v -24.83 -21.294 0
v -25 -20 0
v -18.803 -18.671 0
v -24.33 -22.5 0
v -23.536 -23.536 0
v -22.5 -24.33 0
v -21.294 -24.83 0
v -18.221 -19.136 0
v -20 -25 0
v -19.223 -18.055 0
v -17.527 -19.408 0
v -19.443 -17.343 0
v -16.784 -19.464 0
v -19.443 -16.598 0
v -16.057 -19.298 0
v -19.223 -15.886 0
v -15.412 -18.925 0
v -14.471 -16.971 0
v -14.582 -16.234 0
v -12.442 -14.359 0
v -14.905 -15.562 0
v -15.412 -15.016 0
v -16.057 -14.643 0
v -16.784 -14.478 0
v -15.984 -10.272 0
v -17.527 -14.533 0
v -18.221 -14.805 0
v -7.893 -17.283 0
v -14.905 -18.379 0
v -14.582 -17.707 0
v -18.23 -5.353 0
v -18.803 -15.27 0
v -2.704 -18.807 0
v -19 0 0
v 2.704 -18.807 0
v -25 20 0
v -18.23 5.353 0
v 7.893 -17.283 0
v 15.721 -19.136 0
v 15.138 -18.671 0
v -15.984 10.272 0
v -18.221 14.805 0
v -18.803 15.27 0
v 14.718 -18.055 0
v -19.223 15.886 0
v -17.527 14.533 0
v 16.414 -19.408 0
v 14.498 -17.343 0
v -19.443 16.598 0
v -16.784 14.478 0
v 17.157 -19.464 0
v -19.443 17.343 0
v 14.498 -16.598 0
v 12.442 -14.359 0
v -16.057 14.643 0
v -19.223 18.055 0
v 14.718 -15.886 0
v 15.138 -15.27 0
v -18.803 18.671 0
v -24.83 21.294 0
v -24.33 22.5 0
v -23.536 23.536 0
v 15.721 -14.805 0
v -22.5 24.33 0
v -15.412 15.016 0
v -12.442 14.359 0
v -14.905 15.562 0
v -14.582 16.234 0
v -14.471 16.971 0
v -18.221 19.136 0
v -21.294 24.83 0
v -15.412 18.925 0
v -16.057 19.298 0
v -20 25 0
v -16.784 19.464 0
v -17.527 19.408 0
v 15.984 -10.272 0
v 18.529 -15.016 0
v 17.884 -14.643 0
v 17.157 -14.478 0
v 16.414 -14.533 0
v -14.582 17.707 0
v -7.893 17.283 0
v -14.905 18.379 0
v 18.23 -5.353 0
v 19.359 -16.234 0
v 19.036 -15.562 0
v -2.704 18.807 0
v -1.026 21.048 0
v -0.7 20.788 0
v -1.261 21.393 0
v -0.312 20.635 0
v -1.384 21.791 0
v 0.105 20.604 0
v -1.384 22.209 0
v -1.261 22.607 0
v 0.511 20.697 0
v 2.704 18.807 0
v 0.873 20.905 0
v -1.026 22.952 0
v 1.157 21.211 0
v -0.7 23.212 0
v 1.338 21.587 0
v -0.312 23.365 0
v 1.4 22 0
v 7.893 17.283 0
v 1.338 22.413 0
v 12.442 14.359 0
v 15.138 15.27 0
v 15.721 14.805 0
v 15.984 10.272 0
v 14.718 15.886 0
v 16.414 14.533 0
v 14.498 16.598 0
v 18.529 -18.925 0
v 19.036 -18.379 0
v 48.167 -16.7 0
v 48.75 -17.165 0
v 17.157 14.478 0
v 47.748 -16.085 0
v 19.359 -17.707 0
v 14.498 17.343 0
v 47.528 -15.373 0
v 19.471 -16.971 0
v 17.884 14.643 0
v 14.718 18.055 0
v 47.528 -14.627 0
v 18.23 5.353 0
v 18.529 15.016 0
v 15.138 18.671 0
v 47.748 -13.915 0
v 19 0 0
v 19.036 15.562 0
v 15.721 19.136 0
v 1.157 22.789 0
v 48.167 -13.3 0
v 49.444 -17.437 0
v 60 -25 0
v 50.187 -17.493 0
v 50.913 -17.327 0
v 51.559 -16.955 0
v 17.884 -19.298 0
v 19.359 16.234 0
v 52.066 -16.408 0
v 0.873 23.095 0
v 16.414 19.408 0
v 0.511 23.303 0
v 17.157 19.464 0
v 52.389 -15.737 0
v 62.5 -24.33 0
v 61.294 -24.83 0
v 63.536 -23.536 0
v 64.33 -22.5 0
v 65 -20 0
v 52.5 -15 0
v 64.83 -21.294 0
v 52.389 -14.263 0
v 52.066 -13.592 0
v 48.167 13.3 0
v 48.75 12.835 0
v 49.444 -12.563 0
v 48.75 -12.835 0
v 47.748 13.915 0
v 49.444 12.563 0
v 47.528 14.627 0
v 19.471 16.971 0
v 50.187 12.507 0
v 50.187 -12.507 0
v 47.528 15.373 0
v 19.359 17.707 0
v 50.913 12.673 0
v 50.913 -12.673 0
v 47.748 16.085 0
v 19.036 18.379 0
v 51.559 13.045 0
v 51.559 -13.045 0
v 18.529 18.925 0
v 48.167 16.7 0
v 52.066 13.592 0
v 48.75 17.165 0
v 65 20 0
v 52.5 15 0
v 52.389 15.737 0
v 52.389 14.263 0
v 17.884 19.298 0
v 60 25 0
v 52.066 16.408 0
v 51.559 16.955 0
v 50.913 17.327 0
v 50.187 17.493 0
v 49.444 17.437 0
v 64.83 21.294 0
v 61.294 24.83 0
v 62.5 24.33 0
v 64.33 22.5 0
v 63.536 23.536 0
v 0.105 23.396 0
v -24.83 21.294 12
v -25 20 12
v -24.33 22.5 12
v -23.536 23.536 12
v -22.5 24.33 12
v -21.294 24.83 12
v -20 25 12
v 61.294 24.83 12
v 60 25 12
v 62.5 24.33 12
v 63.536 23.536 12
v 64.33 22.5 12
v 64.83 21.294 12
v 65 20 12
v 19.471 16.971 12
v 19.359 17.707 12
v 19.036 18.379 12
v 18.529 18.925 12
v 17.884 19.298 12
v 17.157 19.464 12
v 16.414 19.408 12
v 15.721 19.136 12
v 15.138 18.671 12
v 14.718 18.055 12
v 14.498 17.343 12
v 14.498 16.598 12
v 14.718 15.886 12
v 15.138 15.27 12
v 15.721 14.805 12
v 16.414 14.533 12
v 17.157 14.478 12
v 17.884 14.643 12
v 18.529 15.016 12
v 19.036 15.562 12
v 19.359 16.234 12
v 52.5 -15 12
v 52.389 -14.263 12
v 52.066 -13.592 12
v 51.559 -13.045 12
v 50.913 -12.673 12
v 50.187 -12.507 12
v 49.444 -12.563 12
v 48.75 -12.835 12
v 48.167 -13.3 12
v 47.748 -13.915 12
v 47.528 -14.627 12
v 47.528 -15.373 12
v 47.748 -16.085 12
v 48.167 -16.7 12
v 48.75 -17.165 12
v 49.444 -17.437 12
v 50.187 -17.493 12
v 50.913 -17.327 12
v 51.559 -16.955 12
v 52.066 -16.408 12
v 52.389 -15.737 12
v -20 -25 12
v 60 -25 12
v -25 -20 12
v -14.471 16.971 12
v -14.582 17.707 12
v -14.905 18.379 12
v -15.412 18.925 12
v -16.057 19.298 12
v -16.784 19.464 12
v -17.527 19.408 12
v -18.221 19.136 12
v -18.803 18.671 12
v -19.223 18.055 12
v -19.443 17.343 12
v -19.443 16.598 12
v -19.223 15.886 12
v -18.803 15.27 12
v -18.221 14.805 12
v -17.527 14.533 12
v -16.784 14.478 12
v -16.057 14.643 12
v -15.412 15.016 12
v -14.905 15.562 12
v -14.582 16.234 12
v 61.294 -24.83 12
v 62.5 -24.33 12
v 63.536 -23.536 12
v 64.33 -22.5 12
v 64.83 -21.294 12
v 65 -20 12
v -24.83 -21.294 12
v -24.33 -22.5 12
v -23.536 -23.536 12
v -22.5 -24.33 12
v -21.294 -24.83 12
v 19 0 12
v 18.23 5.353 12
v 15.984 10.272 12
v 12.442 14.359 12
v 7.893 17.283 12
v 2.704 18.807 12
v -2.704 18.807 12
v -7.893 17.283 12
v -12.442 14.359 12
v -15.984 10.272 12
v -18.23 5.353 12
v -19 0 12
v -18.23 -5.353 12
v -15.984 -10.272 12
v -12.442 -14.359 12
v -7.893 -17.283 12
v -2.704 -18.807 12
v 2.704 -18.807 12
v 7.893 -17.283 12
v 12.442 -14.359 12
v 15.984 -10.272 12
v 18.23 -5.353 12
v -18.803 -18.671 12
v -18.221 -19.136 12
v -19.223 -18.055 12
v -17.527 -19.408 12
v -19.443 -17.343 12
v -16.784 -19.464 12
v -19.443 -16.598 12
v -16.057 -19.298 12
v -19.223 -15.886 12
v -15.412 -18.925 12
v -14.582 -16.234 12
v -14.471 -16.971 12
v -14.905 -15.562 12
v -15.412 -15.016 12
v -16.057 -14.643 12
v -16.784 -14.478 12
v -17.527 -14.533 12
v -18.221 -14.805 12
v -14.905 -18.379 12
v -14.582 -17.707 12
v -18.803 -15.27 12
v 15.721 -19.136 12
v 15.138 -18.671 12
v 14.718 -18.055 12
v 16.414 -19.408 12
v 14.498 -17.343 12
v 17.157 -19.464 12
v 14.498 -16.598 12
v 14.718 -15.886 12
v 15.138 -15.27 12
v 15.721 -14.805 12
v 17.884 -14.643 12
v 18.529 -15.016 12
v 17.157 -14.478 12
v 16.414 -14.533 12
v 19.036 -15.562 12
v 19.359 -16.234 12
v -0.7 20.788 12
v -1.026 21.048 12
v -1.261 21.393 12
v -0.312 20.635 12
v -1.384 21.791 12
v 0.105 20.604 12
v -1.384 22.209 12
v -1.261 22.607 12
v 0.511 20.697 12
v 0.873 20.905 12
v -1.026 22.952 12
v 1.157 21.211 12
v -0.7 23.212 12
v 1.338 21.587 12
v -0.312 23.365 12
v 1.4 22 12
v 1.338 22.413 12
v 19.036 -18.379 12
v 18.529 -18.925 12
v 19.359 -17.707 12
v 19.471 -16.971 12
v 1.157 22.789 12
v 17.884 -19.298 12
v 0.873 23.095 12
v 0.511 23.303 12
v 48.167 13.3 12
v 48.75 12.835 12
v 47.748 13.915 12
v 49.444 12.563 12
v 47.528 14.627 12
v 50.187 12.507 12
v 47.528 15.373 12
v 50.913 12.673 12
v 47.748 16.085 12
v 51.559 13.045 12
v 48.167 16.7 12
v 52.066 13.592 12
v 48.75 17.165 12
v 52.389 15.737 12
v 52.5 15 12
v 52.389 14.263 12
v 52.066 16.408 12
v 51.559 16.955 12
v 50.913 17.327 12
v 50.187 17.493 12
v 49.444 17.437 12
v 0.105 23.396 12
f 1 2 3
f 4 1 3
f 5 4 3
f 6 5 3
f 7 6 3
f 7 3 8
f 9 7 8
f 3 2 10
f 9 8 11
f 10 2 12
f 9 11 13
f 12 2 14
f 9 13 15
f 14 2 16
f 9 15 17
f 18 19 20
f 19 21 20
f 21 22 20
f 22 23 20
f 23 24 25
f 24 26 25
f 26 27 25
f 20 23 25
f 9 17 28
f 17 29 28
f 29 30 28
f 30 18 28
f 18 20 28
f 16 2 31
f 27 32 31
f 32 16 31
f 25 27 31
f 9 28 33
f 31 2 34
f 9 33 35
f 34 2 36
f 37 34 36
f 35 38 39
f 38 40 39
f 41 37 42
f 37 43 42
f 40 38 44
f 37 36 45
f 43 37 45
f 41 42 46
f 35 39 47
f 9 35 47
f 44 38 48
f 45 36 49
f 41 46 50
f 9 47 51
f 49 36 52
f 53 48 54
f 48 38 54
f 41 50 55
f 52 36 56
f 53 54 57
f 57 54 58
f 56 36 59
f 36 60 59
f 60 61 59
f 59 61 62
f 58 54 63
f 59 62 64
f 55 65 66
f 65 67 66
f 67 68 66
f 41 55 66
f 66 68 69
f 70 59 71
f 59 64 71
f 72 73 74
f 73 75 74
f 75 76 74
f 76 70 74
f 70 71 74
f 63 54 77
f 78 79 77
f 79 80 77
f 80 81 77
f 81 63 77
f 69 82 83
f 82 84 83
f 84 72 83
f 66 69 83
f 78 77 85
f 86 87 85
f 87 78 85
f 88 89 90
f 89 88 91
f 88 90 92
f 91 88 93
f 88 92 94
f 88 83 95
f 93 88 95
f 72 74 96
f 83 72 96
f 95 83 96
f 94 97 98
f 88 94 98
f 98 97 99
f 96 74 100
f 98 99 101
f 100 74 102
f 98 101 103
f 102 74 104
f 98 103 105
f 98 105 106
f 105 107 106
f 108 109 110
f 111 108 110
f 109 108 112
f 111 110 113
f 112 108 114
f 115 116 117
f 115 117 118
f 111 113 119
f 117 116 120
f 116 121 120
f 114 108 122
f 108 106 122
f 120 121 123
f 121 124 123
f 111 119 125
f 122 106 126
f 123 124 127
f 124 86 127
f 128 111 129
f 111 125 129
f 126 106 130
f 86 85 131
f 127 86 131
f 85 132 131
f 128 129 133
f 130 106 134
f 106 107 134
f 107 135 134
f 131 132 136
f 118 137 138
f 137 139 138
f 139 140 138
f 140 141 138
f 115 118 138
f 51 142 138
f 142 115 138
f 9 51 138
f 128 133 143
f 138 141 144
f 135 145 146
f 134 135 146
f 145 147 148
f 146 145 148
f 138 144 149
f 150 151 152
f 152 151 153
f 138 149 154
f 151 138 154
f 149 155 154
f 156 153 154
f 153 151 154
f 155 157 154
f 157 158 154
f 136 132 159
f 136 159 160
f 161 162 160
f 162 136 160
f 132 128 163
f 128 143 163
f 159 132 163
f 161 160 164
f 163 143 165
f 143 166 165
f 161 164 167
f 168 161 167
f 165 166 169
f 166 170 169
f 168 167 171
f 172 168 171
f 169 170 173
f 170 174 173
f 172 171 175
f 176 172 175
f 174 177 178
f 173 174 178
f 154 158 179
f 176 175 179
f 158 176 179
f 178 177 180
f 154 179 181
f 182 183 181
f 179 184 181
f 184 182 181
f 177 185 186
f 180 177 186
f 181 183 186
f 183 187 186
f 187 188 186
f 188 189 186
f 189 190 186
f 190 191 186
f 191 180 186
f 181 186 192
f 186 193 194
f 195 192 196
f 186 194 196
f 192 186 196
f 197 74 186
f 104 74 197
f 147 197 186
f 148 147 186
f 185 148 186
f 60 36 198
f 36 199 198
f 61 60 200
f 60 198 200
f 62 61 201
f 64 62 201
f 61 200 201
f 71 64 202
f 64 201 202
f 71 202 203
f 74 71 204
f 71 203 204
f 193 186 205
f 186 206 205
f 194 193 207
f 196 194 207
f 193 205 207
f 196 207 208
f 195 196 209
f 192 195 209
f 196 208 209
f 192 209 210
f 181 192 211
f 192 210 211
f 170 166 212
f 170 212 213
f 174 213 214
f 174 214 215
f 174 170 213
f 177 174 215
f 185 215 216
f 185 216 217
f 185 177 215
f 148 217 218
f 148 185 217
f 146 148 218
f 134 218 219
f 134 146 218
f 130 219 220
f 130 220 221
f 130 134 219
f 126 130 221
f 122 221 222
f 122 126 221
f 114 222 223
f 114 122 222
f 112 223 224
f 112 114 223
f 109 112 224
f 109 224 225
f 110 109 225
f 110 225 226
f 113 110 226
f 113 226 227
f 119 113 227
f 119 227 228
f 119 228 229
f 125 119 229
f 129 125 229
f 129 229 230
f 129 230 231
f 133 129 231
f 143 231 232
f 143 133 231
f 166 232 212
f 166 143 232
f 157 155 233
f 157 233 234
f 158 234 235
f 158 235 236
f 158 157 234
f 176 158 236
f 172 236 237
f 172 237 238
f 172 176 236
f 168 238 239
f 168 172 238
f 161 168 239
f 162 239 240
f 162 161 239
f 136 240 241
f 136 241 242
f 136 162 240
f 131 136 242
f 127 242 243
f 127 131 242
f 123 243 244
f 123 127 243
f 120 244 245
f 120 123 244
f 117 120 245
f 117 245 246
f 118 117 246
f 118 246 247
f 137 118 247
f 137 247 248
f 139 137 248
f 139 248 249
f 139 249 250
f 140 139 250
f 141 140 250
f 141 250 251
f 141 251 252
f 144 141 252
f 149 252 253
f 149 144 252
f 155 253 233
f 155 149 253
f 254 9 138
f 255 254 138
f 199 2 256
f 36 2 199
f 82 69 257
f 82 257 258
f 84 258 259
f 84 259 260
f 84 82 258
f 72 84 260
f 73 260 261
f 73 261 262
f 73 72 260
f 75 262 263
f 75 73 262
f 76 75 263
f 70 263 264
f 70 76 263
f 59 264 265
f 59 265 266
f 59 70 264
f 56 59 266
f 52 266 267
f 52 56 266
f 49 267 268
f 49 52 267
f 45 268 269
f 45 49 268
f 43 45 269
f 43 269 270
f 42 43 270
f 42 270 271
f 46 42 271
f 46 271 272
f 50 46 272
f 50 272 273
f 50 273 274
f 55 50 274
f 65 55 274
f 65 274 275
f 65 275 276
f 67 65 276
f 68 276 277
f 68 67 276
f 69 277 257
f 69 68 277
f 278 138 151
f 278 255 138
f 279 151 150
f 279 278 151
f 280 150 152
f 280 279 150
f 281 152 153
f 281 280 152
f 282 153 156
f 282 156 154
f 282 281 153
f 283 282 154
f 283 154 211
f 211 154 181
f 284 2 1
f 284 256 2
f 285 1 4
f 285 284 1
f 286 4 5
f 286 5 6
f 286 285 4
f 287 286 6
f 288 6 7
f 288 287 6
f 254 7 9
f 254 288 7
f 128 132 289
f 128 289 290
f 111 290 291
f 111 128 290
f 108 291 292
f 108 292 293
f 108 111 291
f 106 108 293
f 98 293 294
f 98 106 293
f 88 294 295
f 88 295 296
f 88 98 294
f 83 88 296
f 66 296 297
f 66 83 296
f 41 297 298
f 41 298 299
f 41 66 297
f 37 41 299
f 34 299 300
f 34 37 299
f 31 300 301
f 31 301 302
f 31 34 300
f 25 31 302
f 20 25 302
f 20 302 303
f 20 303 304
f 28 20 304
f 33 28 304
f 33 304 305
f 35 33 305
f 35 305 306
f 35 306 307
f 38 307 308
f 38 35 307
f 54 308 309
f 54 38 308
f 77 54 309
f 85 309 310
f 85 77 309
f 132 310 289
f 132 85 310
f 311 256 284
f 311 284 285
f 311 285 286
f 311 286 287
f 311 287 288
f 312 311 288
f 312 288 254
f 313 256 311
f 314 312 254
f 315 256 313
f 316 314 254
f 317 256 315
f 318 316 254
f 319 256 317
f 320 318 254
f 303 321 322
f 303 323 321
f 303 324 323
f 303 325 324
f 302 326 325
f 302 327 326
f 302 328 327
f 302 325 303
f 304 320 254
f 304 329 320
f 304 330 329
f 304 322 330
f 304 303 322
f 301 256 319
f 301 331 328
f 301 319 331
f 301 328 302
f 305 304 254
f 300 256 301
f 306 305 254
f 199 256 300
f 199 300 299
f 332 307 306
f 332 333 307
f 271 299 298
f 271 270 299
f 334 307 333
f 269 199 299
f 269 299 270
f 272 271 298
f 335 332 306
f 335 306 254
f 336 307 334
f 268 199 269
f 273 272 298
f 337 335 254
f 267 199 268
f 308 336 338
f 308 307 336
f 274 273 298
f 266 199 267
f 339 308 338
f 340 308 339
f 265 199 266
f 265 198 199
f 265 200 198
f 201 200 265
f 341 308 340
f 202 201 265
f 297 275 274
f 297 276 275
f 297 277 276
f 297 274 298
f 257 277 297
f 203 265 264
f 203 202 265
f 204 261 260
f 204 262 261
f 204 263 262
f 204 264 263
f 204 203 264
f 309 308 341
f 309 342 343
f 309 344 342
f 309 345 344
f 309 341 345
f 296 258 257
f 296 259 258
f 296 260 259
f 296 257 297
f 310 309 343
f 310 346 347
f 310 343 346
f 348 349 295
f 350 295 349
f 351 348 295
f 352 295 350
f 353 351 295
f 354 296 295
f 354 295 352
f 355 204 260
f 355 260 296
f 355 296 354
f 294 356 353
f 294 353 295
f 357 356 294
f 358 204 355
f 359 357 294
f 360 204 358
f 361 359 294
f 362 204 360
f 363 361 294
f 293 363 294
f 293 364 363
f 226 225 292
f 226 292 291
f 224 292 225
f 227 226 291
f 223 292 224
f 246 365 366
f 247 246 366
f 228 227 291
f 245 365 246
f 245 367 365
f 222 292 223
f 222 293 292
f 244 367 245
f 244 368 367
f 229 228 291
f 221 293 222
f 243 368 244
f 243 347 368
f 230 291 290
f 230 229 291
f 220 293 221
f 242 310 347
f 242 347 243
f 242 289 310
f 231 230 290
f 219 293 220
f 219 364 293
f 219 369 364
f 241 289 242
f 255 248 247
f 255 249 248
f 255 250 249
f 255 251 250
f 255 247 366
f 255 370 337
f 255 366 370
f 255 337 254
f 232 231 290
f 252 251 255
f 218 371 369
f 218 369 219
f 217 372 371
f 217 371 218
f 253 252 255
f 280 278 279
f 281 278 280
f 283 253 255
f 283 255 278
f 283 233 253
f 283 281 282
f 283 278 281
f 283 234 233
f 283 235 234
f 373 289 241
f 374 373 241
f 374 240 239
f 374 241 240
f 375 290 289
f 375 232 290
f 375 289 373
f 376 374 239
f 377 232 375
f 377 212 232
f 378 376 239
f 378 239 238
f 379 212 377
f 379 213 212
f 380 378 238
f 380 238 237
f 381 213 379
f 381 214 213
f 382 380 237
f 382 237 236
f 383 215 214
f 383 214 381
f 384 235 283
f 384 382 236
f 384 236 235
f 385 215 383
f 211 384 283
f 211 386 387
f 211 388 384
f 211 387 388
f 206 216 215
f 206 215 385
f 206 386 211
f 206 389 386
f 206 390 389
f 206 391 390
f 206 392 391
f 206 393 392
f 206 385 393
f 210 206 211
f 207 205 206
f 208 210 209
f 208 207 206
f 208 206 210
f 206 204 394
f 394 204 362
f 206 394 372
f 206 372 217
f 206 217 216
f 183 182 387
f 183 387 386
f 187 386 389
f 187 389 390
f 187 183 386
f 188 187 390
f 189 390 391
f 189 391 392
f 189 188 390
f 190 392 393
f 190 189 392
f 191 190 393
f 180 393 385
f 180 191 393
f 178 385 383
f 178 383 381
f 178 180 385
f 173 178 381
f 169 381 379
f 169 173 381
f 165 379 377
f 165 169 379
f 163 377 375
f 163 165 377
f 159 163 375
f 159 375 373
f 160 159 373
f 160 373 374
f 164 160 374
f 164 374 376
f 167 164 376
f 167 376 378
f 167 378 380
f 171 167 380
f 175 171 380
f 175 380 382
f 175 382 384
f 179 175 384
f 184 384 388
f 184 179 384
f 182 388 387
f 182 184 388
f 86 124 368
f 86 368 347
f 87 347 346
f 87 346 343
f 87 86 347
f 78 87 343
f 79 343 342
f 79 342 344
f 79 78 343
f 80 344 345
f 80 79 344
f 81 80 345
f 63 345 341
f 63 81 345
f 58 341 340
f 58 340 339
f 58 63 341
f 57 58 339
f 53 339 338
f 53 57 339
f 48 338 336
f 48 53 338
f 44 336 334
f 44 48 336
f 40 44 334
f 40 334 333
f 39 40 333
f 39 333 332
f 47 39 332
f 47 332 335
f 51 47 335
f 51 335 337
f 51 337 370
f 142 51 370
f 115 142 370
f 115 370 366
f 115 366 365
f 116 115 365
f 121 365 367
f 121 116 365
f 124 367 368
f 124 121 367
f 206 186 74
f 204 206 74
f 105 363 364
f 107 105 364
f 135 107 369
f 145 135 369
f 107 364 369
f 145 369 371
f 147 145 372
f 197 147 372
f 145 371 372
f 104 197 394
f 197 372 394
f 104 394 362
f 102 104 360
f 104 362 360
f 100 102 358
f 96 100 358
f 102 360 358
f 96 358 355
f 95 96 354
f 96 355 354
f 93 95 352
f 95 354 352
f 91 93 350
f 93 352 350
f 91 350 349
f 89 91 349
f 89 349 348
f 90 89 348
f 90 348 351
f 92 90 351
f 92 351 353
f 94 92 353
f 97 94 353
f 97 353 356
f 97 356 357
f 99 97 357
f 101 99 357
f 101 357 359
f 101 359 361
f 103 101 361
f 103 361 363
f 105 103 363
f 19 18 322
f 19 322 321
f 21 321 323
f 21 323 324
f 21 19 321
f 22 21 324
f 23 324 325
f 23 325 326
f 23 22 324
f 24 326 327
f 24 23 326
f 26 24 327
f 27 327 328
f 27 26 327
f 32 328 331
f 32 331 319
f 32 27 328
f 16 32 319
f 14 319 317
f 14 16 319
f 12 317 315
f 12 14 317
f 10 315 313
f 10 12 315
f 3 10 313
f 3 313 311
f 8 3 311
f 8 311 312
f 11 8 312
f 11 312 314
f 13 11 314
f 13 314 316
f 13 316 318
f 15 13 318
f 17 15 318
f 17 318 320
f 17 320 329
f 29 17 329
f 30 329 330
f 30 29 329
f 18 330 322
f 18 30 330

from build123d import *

# Parameters (mm, degrees)
F0_W     = 50
F0_H     = 50
F0_R     = 2.5
F0_R_2   = 19
F0_W_2   = 40
F1_DEPTH = 12
F2_R     = 1.4
F3_DEPTH = 12.001
F4_R     = 5


with BuildPart() as f1:
    # F0 (on Top) → F1 (new body)
    with BuildSketch(Plane.XY):
        Rectangle(F0_W, F0_H)
        with Locations((-16.970563, -16.970563)):
            Circle(F0_R, mode=Mode.SUBTRACT)
        with Locations((16.970563, -16.970563)):
            Circle(F0_R, mode=Mode.SUBTRACT)
        Circle(F0_R_2, mode=Mode.SUBTRACT)
        with Locations((-16.970563, 16.970563)):
            Circle(F0_R, mode=Mode.SUBTRACT)
        with Locations((16.970563, 16.970563)):
            Circle(F0_R, mode=Mode.SUBTRACT)
        with Locations((45, 0)):
            Rectangle(F0_W_2, F0_H)
        with Locations((50, -15)):
            Circle(F0_R, mode=Mode.SUBTRACT)
        with Locations((50, 15)):
            Circle(F0_R, mode=Mode.SUBTRACT)
    extrude(amount=F1_DEPTH)

    # F2 (on face) → F3 (cut, through all)
    with BuildSketch(Plane.XY.offset(12)):
        with Locations((0, 22)):
            Circle(F2_R)
    extrude(amount=-F3_DEPTH, mode=Mode.SUBTRACT)

    # F4
    f4_edges = [f1.edges().sort_by_distance(p)[0] for p in [
        (65, -25, 6),
        (-25, -25, 6),
        (-25, 25, 6),
        (65, 25, 6),
    ]]
    fillet(f4_edges, radius=F4_R)


solid = f1.part
